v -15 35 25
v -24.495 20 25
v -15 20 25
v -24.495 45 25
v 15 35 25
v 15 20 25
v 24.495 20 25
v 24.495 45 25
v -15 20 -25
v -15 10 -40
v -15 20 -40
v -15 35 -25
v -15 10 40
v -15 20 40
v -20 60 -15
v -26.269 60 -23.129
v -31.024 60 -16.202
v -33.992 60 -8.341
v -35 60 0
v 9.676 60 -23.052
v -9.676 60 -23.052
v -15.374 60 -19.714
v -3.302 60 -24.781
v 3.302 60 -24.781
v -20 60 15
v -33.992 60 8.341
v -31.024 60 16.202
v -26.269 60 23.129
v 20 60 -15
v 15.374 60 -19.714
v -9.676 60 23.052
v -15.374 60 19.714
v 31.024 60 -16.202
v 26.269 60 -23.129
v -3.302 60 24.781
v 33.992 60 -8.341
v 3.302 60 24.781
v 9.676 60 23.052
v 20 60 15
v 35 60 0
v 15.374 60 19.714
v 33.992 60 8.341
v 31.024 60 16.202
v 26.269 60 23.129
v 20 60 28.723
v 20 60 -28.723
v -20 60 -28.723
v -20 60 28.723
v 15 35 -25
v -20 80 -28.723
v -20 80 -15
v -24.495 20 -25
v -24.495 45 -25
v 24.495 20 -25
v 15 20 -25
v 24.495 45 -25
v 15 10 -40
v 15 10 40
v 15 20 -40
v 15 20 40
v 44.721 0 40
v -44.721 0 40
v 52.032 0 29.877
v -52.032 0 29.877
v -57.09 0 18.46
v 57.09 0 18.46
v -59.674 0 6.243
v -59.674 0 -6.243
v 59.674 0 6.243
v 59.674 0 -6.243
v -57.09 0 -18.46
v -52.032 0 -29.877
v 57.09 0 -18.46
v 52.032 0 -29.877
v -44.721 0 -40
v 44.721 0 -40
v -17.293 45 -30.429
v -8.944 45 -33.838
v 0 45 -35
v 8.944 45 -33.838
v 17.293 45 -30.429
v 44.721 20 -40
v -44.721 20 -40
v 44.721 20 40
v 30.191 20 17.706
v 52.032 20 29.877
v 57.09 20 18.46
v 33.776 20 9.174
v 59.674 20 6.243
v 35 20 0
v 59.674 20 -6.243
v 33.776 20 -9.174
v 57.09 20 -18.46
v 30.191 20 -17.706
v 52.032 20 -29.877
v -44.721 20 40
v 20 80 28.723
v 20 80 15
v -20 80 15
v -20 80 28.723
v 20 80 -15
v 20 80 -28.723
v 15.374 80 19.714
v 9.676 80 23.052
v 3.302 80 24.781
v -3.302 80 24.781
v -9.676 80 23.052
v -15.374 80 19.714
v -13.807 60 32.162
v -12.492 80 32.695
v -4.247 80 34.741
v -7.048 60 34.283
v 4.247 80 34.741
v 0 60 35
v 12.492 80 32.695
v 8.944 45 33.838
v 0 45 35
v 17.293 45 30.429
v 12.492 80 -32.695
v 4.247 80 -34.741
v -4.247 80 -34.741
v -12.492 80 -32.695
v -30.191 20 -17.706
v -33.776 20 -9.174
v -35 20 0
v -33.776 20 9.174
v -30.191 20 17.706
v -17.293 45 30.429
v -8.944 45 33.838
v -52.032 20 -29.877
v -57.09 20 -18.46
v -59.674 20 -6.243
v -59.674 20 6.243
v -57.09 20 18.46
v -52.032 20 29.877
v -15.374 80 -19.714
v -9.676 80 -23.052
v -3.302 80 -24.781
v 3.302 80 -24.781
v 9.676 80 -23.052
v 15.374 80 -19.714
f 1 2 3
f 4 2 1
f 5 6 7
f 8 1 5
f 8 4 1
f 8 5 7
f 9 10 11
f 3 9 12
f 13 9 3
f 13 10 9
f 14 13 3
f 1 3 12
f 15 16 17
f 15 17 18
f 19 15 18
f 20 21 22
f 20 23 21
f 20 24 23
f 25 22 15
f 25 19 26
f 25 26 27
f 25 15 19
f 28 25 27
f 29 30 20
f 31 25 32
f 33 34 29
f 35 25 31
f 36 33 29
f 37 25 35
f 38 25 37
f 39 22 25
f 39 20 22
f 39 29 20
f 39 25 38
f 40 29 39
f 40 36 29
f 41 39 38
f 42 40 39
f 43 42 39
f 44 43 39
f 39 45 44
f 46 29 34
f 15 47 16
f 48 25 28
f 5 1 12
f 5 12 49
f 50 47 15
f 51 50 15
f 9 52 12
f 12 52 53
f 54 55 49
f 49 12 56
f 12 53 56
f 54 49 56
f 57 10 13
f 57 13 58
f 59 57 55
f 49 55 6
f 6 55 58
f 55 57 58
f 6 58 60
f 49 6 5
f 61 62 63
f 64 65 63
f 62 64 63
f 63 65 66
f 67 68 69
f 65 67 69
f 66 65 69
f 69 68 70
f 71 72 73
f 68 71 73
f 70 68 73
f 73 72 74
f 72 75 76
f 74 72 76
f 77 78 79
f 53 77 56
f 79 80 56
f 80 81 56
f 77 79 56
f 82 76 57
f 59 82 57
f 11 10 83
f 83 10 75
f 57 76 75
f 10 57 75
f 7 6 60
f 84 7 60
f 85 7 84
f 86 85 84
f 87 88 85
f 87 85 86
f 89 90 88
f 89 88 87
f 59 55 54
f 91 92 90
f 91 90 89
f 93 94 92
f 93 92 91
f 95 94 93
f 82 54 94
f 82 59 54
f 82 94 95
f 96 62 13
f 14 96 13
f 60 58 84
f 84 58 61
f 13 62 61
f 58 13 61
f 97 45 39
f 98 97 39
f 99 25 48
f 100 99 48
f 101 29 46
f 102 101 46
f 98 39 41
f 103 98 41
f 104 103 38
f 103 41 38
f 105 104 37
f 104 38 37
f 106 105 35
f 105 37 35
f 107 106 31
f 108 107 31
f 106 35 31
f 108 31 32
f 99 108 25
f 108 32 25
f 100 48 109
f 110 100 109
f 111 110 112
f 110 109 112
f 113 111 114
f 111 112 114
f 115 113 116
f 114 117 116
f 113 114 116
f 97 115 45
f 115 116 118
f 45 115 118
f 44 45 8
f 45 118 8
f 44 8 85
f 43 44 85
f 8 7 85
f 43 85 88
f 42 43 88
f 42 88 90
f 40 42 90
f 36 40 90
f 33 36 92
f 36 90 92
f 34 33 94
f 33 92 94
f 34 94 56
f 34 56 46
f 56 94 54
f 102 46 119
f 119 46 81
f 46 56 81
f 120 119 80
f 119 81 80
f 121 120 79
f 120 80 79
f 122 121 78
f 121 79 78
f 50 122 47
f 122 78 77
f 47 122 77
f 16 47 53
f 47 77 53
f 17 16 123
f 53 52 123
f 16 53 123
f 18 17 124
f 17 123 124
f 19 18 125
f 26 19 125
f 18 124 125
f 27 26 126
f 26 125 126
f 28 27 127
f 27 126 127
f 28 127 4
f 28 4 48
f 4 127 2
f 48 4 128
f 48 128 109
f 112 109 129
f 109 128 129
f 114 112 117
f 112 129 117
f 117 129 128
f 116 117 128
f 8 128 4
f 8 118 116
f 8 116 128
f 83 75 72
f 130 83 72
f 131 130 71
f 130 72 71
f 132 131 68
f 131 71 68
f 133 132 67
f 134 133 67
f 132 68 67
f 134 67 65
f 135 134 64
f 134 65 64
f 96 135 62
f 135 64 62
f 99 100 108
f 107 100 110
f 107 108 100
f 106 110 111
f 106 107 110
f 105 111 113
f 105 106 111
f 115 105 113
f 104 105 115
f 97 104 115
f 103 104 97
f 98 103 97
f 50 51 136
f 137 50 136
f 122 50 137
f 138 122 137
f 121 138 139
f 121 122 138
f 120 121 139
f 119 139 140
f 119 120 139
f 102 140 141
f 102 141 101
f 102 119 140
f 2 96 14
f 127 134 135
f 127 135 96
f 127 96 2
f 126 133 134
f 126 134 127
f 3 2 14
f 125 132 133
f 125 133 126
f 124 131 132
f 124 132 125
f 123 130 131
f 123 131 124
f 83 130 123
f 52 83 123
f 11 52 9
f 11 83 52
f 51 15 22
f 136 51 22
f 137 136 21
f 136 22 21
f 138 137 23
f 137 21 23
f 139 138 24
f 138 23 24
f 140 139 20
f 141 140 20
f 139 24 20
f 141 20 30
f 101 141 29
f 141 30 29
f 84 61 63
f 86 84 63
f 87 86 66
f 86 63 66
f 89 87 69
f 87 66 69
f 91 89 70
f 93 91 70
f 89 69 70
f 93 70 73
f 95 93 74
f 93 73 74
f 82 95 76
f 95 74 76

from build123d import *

# Parameters (mm, degrees)
BOSS_EXTRUDE1_DEPTH = 20
SKETCH2_R           = 35
BOSS_EXTRUDE2_DEPTH = 40
SKETCH3_W           = 30
SKETCH3_H           = 25
CUT_EXTRUDE1_DEPTH  = 128
SKETCH4_W           = 89.4427191
SKETCH4_H           = 25
CUT_EXTRUDE2_DEPTH  = 15
BOSS_EXTRUDE3_DEPTH = 20


with BuildPart() as part:
    # Sketch1 → Boss-Extrude1 (new body)
    with BuildSketch(Plane(origin=(0, 0, 0), x_dir=(1, 0, 0), z_dir=(0, 1, 0))):
        with BuildLine():
            Line((-44.72135955, -40), (44.72135955, -40))
            ThreePointArc((44.72135955, -40), (60, 0), (44.72135955, 40))
            Line((44.72135955, 40), (-44.72135955, 40))
            ThreePointArc((-44.72135955, 40), (-60, 0), (-44.72135955, -40))
        make_face()
    extrude(amount=BOSS_EXTRUDE1_DEPTH)

    # Sketch2 → Boss-Extrude2 (add)
    with BuildSketch(Plane(origin=(0, 20, 0), x_dir=(1, 0, 0), z_dir=(0, 1, 0))):
        with Locations(Location((0, 0, 0), (0, 0, 270))):
            Circle(SKETCH2_R)
    extrude(amount=BOSS_EXTRUDE2_DEPTH)

    # Sketch3 → Cut-Extrude1 (cut)
    with BuildSketch(Plane.XY.offset(40)):
        with Locations((0, 22.5)):
            Rectangle(SKETCH3_W, SKETCH3_H)
    extrude(amount=-CUT_EXTRUDE1_DEPTH, mode=Mode.SUBTRACT)

    # Sketch4 → Cut-Extrude2 (cut)
    with BuildSketch(Plane.XY.offset(40)):
        with Locations((0, 32.5)):
            Rectangle(SKETCH4_W, SKETCH4_H)
    cut_extrude2 = extrude(amount=-CUT_EXTRUDE2_DEPTH, mode=Mode.SUBTRACT)

    # Mirror1: Cut-Extrude2 across plane
    add(cut_extrude2.mirror(Plane.XY), mode=Mode.SUBTRACT)

    # Sketch6 → Boss-Extrude3 (add)
    with BuildSketch(Plane(origin=(0, 60, 0), x_dir=(1, 0, 0), z_dir=(0, 1, 0))):
        with BuildLine():
            ThreePointArc((20, 28.722813233), (0, 35), (-20, 28.722813233))
            Line((-20, 28.722813233), (-20, 15))
            ThreePointArc((-20, 15), (0, 25), (20, 15))
            Line((20, 15), (20, 28.722813233))
        make_face()
        with BuildLine():
            Line((-20, -15), (-20, -28.722813233))
            ThreePointArc((-20, -28.722813233), (0, -35), (20, -28.722813233))
            Line((20, -28.722813233), (20, -15))
            ThreePointArc((20, -15), (0, -25), (-20, -15))
        make_face()
    extrude(amount=BOSS_EXTRUDE3_DEPTH)


solid = part.part
